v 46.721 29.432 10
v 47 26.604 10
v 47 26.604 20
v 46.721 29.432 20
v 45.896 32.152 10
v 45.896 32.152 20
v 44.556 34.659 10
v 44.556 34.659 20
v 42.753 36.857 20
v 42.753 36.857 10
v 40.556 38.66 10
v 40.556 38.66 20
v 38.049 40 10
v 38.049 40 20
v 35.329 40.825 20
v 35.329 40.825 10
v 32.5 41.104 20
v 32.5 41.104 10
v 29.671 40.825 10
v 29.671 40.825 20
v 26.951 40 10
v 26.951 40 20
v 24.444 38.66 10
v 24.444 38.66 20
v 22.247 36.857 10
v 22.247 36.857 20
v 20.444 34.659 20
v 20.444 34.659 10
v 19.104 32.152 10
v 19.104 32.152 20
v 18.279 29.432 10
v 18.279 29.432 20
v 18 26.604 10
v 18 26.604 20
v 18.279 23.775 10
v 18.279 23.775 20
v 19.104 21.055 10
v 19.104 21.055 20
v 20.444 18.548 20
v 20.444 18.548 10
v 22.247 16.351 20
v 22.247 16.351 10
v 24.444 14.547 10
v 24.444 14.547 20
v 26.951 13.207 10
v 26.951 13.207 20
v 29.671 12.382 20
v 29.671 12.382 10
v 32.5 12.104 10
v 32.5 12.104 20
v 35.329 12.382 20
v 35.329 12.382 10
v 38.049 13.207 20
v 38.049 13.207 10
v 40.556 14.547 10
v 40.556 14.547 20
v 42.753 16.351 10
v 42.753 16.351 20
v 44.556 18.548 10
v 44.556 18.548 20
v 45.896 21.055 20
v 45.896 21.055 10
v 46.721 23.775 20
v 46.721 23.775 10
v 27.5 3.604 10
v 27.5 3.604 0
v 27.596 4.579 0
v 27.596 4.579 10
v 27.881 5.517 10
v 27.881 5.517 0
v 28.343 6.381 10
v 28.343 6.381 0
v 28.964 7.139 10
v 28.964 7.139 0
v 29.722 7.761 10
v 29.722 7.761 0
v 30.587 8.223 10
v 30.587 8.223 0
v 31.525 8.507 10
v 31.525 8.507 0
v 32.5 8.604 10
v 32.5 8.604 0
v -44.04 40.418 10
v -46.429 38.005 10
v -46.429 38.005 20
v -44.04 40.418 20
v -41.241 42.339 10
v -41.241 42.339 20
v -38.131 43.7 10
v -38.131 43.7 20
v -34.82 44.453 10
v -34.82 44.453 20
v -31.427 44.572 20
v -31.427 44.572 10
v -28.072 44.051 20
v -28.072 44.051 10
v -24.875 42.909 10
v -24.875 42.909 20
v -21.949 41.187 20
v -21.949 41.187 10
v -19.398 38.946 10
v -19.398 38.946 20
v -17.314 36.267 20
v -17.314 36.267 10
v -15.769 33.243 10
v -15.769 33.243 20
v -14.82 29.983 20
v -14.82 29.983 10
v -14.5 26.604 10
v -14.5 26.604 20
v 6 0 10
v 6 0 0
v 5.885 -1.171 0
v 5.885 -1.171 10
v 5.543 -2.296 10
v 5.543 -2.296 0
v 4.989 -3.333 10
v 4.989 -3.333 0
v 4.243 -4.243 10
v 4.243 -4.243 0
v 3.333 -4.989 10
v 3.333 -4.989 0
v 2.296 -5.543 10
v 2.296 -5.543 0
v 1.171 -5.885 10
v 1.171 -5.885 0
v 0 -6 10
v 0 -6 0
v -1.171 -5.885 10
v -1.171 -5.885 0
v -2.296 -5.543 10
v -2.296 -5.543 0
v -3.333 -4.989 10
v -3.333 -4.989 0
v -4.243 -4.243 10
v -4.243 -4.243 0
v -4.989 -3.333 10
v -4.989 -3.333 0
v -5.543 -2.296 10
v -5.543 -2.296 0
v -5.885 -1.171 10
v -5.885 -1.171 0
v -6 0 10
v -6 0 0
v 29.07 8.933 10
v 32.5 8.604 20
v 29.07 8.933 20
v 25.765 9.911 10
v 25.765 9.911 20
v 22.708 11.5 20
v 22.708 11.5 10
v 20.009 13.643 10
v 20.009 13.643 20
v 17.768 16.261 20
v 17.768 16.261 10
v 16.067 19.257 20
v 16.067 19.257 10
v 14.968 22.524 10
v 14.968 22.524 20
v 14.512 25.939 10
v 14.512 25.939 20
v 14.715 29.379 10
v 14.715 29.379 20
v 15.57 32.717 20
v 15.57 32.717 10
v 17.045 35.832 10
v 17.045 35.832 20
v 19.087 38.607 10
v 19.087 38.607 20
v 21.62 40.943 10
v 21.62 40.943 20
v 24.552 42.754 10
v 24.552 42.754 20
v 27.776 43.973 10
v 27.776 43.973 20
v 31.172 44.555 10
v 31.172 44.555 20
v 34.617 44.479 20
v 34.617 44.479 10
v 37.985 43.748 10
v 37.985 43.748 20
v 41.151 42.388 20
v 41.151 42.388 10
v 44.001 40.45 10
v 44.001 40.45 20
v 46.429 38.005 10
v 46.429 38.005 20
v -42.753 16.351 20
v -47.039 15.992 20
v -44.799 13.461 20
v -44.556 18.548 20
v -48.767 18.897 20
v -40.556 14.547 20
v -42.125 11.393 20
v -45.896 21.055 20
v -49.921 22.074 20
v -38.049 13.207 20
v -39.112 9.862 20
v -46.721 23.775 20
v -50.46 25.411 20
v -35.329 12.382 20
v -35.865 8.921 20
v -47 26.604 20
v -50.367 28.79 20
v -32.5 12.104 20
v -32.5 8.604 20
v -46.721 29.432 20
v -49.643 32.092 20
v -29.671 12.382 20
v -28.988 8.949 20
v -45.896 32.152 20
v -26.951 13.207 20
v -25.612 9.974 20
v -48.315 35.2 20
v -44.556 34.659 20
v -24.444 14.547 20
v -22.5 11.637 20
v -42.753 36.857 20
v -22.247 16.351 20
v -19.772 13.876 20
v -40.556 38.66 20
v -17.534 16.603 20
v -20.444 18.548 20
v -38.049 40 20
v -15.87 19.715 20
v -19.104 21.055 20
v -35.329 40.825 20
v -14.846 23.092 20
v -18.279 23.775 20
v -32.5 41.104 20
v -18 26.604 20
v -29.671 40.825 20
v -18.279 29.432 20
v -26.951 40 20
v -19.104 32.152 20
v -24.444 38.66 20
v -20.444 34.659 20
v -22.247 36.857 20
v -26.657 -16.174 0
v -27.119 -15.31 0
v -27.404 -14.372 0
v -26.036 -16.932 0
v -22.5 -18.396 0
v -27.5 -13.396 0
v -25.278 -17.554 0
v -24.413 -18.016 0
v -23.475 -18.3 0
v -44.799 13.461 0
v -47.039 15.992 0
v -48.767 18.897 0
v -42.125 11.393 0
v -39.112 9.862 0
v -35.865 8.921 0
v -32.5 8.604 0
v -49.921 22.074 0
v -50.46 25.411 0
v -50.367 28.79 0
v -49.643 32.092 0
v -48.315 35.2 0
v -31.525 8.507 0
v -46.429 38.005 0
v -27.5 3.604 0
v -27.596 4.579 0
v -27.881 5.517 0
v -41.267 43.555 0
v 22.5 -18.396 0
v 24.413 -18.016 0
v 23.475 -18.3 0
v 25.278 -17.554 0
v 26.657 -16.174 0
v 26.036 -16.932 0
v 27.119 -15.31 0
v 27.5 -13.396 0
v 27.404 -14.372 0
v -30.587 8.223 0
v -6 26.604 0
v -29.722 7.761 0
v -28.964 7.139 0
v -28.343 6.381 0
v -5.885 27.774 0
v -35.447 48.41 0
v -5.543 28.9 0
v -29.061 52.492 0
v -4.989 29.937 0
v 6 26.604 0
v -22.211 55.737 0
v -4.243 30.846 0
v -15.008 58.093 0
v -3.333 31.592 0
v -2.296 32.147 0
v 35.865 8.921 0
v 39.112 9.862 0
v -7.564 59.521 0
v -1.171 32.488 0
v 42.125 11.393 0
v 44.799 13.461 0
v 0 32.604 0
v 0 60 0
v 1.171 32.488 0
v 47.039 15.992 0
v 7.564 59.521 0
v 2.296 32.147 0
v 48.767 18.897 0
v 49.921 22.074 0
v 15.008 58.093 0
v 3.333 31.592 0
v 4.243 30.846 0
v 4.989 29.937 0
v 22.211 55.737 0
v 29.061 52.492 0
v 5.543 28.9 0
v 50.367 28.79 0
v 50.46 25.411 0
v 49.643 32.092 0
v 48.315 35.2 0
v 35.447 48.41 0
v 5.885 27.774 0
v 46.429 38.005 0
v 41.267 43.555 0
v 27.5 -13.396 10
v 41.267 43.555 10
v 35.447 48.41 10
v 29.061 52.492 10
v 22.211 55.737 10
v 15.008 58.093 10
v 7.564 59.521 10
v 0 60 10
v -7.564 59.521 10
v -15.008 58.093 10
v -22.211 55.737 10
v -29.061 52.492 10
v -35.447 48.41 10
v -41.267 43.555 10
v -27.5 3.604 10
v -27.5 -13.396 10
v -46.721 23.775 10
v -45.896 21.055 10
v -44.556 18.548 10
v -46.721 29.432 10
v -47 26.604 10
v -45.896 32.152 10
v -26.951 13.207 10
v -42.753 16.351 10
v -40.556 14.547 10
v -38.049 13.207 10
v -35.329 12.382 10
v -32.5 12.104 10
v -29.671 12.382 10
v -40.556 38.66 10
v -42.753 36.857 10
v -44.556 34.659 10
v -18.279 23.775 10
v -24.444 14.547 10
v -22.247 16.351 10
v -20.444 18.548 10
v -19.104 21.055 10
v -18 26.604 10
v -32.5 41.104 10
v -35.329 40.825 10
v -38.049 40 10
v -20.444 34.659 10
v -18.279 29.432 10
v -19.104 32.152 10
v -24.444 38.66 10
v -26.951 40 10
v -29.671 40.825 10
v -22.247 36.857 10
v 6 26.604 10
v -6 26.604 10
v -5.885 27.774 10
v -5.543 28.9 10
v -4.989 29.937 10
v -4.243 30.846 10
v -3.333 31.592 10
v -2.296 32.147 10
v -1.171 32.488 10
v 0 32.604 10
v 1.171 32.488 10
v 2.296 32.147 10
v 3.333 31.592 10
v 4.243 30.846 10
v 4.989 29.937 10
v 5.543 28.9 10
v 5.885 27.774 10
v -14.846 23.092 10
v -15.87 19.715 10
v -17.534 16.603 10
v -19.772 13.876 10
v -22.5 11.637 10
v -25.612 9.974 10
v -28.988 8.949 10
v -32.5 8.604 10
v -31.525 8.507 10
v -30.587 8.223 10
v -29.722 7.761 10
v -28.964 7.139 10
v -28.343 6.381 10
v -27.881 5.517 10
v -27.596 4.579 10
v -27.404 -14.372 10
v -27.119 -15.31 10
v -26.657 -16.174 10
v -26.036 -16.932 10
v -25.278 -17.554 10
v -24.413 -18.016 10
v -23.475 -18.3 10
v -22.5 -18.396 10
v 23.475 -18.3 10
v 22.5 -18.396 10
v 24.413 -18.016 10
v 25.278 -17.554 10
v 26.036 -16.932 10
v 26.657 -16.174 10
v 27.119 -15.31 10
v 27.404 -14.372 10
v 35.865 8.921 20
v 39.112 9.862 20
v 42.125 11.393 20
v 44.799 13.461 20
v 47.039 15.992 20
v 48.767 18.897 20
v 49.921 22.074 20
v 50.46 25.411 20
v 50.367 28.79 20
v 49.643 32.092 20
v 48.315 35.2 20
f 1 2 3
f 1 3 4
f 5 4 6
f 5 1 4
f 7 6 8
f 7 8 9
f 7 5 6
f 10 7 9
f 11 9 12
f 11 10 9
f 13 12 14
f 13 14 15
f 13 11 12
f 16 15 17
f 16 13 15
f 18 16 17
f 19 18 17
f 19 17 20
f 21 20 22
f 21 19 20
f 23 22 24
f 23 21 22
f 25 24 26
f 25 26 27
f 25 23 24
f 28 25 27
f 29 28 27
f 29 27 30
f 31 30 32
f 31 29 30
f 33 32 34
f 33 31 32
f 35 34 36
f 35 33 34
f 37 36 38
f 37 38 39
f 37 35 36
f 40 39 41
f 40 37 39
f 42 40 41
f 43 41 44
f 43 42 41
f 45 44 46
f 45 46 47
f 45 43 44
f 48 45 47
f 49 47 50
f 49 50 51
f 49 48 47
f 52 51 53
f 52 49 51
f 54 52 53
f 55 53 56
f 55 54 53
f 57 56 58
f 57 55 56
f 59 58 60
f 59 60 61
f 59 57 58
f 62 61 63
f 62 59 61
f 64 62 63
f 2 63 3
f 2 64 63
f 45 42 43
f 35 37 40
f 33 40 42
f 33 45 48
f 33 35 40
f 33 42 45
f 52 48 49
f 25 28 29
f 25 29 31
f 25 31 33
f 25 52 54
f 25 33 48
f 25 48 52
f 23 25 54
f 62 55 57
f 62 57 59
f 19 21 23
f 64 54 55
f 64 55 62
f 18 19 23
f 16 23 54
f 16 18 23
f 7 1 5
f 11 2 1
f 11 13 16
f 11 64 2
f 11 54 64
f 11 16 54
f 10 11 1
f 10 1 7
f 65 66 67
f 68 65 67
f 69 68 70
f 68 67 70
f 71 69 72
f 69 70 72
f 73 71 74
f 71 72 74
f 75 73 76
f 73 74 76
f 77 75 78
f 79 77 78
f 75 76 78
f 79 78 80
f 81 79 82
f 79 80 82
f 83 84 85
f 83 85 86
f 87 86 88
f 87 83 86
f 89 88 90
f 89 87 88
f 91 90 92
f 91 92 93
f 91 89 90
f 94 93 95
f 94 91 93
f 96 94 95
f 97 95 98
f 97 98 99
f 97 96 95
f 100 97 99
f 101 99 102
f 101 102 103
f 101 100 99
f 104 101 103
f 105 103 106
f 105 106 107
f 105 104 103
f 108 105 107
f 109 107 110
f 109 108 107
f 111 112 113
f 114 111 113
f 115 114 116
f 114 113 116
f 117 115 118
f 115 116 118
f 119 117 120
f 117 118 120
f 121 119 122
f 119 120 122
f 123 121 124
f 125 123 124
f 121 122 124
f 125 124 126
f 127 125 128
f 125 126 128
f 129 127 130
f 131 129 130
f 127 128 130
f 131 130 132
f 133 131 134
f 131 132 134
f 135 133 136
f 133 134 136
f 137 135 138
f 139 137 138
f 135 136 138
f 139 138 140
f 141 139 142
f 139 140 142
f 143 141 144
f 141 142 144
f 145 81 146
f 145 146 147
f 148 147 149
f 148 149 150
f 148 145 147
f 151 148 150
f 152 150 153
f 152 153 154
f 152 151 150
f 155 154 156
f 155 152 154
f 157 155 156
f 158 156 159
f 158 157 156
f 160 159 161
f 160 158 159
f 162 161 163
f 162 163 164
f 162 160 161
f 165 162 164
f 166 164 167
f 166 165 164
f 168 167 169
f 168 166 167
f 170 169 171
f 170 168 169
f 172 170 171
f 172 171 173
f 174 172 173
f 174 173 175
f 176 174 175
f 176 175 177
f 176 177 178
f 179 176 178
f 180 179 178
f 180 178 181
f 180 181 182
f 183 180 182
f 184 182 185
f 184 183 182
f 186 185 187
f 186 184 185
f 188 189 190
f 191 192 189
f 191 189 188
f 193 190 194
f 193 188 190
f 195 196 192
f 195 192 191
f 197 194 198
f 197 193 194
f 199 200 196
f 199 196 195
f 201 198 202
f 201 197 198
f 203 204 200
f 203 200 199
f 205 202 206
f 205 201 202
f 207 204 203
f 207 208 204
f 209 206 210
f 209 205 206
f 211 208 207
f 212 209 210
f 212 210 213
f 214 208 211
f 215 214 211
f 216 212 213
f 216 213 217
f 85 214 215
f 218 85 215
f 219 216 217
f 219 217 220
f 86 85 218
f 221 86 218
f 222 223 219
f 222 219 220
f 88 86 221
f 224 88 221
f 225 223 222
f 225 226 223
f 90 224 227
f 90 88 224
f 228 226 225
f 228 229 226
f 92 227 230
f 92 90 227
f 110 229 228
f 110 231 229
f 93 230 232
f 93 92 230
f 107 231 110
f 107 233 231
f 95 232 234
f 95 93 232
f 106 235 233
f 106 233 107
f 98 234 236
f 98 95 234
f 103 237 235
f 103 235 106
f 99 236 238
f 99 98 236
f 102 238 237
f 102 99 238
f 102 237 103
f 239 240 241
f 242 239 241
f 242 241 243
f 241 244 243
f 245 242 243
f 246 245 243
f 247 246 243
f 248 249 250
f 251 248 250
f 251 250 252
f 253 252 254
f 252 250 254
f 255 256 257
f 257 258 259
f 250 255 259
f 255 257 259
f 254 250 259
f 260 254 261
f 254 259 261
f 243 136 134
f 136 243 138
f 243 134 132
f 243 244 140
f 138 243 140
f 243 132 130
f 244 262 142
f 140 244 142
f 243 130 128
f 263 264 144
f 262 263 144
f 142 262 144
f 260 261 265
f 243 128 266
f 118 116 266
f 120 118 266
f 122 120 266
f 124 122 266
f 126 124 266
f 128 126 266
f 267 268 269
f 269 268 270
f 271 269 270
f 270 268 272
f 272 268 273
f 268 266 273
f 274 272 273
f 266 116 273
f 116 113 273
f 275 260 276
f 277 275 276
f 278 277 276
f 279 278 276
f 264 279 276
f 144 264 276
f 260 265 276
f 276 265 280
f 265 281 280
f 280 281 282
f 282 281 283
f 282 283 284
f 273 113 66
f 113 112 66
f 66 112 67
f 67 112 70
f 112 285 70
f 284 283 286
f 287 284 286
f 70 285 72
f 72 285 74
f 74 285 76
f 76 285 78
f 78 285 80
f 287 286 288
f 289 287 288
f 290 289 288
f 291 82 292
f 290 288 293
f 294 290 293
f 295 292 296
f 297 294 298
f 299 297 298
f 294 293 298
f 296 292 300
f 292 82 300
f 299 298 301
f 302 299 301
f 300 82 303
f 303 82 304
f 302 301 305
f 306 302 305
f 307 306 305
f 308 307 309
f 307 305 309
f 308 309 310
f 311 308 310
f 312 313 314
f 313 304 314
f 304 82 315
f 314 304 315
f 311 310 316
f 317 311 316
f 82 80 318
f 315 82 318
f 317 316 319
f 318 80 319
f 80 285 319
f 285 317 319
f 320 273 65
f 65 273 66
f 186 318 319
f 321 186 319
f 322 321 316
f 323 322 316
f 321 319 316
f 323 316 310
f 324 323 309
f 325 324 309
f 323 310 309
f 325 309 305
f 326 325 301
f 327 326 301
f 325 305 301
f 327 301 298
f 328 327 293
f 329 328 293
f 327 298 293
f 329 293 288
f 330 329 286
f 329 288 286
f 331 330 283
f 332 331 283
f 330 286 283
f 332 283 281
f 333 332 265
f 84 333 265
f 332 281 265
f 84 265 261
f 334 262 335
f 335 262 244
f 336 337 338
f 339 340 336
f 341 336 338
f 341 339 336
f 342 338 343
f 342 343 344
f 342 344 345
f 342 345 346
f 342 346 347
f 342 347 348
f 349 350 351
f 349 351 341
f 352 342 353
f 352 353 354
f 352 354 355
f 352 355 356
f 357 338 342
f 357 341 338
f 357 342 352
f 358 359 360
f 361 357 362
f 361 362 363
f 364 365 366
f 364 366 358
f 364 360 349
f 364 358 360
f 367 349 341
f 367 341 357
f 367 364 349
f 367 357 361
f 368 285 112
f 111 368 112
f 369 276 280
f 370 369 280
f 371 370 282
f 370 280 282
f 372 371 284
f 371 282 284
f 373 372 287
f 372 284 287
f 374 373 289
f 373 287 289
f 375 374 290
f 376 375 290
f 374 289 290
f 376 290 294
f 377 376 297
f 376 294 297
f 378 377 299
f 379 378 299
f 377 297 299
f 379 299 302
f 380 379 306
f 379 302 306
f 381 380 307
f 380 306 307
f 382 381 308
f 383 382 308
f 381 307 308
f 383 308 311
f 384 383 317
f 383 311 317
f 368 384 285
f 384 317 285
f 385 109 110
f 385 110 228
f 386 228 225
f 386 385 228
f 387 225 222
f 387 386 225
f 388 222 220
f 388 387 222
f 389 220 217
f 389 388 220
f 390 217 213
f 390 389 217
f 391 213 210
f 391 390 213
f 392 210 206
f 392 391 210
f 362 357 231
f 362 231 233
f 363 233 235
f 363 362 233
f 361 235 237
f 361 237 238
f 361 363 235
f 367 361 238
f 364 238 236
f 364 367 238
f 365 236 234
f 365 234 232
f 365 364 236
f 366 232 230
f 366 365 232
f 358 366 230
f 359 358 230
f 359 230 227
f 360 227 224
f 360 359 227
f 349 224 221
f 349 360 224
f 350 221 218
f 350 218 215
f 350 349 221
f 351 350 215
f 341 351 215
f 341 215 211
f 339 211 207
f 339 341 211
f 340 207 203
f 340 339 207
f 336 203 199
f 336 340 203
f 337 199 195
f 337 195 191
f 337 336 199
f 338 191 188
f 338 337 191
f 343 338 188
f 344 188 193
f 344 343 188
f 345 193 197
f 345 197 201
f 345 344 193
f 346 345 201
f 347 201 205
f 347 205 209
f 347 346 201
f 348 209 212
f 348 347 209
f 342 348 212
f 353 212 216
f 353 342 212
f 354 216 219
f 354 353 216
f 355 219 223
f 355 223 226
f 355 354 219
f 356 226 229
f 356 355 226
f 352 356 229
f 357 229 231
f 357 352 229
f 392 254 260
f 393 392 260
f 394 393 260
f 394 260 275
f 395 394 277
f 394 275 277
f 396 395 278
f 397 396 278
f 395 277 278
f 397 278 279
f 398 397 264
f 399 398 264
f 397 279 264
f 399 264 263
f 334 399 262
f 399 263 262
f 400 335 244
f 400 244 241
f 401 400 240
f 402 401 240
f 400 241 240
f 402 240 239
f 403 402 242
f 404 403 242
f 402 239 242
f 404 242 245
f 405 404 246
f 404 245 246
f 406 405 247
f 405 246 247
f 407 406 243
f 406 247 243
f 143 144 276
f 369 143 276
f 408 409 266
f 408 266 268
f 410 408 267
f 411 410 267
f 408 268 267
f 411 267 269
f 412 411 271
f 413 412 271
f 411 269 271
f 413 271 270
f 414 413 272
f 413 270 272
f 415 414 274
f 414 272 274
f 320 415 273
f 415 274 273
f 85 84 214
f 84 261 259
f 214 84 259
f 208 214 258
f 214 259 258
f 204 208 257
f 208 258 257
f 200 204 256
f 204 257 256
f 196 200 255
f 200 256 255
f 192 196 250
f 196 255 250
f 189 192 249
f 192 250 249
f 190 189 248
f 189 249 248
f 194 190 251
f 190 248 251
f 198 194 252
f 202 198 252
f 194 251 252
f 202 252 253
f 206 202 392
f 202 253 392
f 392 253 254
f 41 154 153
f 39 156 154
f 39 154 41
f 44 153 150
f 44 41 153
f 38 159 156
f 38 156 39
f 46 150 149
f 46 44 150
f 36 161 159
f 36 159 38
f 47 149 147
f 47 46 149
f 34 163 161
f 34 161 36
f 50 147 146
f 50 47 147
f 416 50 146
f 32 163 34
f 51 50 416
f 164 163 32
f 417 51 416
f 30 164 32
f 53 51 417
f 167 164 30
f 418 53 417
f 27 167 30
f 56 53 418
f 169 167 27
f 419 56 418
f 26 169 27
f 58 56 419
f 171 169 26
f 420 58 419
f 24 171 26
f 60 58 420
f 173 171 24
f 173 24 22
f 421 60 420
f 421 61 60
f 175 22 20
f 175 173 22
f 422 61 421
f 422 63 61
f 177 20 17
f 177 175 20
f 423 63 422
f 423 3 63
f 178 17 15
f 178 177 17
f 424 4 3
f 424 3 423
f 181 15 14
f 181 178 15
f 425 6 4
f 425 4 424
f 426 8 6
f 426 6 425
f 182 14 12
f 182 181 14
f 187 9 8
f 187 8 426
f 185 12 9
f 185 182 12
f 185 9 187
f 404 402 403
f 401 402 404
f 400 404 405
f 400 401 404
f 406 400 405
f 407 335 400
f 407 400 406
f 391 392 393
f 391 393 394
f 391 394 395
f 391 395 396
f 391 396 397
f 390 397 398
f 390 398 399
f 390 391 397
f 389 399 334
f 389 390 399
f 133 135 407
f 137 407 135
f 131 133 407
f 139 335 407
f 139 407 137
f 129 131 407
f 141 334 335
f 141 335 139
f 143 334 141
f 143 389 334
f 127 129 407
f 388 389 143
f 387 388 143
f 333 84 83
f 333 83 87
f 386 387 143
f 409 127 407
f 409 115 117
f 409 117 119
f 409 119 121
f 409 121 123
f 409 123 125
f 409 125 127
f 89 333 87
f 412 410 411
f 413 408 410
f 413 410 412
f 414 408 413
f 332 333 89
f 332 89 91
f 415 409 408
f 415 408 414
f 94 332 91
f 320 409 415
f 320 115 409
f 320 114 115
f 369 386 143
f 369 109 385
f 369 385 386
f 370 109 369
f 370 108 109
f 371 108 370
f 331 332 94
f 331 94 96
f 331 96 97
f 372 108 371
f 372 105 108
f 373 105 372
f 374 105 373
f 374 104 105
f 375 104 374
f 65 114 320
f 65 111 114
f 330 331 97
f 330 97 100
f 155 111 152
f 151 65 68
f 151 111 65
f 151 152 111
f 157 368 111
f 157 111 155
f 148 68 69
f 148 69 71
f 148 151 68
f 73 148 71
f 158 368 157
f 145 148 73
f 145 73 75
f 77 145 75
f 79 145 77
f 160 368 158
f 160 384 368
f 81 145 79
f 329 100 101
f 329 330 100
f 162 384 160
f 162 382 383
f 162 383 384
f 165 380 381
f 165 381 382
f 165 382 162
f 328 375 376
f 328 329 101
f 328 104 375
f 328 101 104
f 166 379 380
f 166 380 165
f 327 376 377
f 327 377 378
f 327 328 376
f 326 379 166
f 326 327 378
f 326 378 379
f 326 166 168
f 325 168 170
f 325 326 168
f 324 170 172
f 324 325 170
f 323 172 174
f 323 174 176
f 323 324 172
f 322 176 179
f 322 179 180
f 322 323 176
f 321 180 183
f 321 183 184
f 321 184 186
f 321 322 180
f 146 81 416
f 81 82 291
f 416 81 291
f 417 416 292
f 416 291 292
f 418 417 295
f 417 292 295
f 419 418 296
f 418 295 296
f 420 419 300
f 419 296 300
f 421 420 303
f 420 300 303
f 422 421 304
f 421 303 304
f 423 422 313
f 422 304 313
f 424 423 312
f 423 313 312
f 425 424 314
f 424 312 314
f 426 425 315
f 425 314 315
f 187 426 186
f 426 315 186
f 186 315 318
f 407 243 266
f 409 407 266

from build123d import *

# Parameters (mm, degrees)
SZKIC1_R                    = 18
SZKIC1_R_2                  = 13
DODANIE_WYCI_GNI_CIE5_DEPTH = 20
WYTNIJ_WYCI_GNI_CIE1_START  = -10
SZKIC3_R                    = 14.5
WYTNIJ_WYCI_GNI_CIE1_DEPTH  = 10


with BuildPart() as part:
    # Szkic1 → Dodanie-wyciągnięcie5 (new body)
    # profile 1 of 5: a face of its own
    with BuildSketch(Plane.XY):
        with BuildLine():
            ThreePointArc((-27.5, -13.396428811), (-26.035533906, -16.931962717), (-22.5, -18.396428811))
            Line((-22.5, -18.396428811), (22.5, -18.396428811))
            ThreePointArc((22.5, -18.396428811), (26.035533906, -16.931962717), (27.5, -13.396428811))
            Line((27.5, -13.396428811), (27.5, 3.603571189))
            ThreePointArc((27.5, 3.603571189), (28.964466094, 7.139105095), (32.5, 8.603571189))
            ThreePointArc((32.5, 8.603571189), (16.233046549, 34.309817059), (46.428571429, 38.005101698))
            ThreePointArc((46.428571429, 38.005101698), (0, 60), (-46.428571429, 38.005101698))
            ThreePointArc((-46.428571429, 38.005101698), (-26.446665618, 43.555182996), (-14.5, 26.603571189))
            ThreePointArc((-14.5, 26.603571189), (-19.772077939, 13.875649127), (-32.5, 8.603571189))
            ThreePointArc((-32.5, 8.603571189), (-28.964466094, 7.139105095), (-27.5, 3.603571189))
            Line((-27.5, 3.603571189), (-27.5, -13.396428811))
        make_face()
        with BuildLine():
            Line((-6, 0), (-6, 26.603571189))
            ThreePointArc((-6, 26.603571189), (0, 32.603571189), (6, 26.603571189))
            Line((6, 26.603571189), (6, 0))
            ThreePointArc((6, 0), (0, -6), (-6, 0))
        make_face(mode=Mode.SUBTRACT)
    # profile 2 of 5: a face of its own
    with BuildSketch(Plane.XY):
        with Locations((-32.5, 26.603571189)):
            Circle(SZKIC1_R)
        with Locations((-32.5, 26.603571189)):
            Circle(SZKIC1_R_2, mode=Mode.SUBTRACT)
    # profile 3 of 5: a face of its own
    with BuildSketch(Plane.XY):
        with Locations((32.5, 26.603571189)):
            Circle(SZKIC1_R)
        with Locations((32.5, 26.603571189)):
            Circle(SZKIC1_R_2, mode=Mode.SUBTRACT)
    # profile 4 of 5: a face of its own
    with BuildSketch(Plane.XY):
        with Locations((32.5, 26.603571189)):
            Circle(SZKIC1_R_2)
    # profile 5 of 5: a face of its own
    with BuildSketch(Plane.XY):
        with Locations((-32.5, 26.603571189)):
            Circle(SZKIC1_R_2)
    extrude(amount=DODANIE_WYCI_GNI_CIE5_DEPTH)

    # Szkic3 → Wytnij-wyciągnięcie1 (cut)
    # profile 1 of 3: a face of its own
    with BuildSketch(Plane.XY.offset(20).offset(WYTNIJ_WYCI_GNI_CIE1_START)):
        with BuildLine():
            ThreePointArc((-32.5, 8.603571189), (-28.964466094, 7.139105095), (-27.5, 3.603571189))
            Line((-27.5, 3.603571189), (-27.5, -13.396428811))
            ThreePointArc((-27.5, -13.396428811), (-26.035533906, -16.931962717), (-22.5, -18.396428811))
            Line((-22.5, -18.396428811), (22.5, -18.396428811))
            ThreePointArc((22.5, -18.396428811), (26.035533906, -16.931962717), (27.5, -13.396428811))
            Line((27.5, -13.396428811), (27.5, 3.603571189))
            ThreePointArc((27.5, 3.603571189), (28.964466094, 7.139105095), (32.5, 8.603571189))
            ThreePointArc((32.5, 8.603571189), (16.233046549, 34.309817059), (46.428571429, 38.005101698))
            ThreePointArc((46.428571429, 38.005101698), (0, 60), (-46.428571429, 38.005101698))
            ThreePointArc((-46.428571429, 38.005101698), (-26.446665618, 43.555182996), (-14.5, 26.603571189))
            ThreePointArc((-14.5, 26.603571189), (-19.772077939, 13.875649127), (-32.5, 8.603571189))
        make_face()
        with BuildLine():
            Line((-6, 0), (-6, 26.603571189))
            ThreePointArc((-6, 26.603571189), (0, 32.603571189), (6, 26.603571189))
            Line((6, 26.603571189), (6, 0))
            ThreePointArc((6, 0), (0, -6), (-6, 0))
        make_face(mode=Mode.SUBTRACT)
    # profile 2 of 3: a face of its own
    with BuildSketch(Plane.XY.offset(20).offset(WYTNIJ_WYCI_GNI_CIE1_START)):
        with Locations((-32.5, 26.603571189)):
            Circle(SZKIC3_R)
    # profile 3 of 3: a face of its own
    with BuildSketch(Plane.XY.offset(20).offset(WYTNIJ_WYCI_GNI_CIE1_START)):
        with Locations((32.5, 26.603571189)):
            Circle(SZKIC3_R)
    extrude(amount=WYTNIJ_WYCI_GNI_CIE1_DEPTH, mode=Mode.SUBTRACT)


solid = part.part
